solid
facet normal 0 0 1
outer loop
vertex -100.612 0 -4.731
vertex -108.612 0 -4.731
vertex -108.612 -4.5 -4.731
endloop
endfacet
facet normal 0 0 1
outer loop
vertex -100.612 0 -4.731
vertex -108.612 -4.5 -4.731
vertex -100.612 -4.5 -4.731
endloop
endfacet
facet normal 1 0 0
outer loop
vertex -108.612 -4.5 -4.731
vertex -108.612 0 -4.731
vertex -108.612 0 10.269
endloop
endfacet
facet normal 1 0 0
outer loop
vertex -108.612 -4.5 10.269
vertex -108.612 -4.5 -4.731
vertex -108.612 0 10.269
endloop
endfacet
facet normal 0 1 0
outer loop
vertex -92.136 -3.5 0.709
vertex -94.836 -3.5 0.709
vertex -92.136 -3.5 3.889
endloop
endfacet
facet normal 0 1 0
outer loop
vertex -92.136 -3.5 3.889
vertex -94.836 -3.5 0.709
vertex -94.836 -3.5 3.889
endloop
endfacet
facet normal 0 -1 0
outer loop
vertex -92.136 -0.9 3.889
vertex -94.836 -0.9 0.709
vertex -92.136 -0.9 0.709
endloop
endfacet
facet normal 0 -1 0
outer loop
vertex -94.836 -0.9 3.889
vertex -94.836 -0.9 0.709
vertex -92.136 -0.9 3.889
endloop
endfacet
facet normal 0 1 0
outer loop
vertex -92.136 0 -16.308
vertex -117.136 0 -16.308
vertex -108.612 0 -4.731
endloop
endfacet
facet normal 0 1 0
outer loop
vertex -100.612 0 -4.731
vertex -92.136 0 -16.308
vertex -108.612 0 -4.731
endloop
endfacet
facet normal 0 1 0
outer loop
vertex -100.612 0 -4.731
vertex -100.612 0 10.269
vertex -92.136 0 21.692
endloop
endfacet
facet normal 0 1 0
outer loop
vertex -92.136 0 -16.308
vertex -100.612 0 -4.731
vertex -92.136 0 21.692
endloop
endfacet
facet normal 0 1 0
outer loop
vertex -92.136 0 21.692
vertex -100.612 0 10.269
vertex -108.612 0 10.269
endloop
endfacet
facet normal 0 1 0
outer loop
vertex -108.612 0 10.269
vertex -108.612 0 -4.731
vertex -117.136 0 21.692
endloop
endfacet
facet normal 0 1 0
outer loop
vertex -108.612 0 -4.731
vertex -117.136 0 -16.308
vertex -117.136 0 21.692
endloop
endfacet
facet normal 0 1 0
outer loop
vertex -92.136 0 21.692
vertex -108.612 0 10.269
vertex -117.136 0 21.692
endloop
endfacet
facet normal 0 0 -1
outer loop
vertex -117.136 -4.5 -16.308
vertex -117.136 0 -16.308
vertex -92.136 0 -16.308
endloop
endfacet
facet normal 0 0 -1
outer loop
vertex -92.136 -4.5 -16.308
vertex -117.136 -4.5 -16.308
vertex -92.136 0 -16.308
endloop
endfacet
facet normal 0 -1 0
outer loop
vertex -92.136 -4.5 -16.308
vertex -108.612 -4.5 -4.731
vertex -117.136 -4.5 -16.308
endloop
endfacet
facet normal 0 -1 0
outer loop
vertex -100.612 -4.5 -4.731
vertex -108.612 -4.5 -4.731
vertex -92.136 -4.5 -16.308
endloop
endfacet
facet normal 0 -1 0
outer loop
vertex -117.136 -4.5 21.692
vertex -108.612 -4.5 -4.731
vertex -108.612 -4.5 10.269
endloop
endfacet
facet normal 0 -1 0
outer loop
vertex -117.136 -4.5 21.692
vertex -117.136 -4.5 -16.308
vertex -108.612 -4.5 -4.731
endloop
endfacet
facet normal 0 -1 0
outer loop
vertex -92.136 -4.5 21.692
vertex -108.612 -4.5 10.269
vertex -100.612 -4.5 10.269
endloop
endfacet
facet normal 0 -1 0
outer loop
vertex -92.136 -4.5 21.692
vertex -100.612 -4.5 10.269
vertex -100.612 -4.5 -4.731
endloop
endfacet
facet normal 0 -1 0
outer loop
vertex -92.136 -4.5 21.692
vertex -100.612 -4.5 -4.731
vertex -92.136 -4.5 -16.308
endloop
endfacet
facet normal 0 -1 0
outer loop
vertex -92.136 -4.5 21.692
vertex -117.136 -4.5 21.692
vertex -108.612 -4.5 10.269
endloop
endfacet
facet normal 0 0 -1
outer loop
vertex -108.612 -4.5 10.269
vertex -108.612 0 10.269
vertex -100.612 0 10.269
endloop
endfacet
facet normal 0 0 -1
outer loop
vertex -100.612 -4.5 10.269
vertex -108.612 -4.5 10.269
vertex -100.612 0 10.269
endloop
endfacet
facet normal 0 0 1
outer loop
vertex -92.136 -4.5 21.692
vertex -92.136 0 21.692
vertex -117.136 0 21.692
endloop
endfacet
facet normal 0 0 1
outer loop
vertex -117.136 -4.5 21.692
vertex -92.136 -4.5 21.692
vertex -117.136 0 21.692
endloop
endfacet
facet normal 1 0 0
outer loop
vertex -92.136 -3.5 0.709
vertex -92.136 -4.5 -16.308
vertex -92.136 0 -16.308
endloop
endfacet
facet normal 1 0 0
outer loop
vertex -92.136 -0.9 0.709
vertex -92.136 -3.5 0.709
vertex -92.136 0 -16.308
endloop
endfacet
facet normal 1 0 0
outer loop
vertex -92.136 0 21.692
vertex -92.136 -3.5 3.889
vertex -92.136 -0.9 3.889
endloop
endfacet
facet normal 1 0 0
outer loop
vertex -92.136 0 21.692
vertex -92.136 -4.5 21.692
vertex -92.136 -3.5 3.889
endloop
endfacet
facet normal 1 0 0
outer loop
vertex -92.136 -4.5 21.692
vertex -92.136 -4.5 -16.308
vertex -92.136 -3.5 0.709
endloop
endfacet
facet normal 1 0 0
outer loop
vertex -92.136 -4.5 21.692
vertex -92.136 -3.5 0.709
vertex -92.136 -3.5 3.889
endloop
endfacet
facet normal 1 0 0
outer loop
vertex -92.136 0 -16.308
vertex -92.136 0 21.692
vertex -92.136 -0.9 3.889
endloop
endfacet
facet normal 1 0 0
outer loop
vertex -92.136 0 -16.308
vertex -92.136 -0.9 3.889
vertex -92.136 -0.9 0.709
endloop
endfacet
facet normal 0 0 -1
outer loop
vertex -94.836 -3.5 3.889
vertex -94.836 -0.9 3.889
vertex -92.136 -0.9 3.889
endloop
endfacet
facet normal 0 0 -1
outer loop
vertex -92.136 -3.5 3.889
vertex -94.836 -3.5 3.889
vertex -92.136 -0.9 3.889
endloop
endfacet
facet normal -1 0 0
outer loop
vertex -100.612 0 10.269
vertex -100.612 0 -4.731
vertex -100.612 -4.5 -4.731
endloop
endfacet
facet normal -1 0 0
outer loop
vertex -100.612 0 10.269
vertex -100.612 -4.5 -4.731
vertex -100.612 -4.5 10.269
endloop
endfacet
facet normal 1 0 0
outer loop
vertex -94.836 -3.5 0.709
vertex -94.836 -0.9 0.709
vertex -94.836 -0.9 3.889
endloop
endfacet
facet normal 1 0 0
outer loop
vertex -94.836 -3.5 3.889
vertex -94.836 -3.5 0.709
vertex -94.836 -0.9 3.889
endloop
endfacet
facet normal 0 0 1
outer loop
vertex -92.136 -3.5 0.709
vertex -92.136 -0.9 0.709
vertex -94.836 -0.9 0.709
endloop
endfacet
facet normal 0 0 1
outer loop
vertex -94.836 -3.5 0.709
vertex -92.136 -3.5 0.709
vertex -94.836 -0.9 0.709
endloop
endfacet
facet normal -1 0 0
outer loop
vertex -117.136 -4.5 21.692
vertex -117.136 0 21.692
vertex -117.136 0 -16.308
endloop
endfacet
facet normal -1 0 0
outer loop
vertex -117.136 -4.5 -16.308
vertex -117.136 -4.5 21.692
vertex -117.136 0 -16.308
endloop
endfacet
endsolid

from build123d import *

# Parameters (mm, degrees)
F0_W     = 8
F0_H     = 15
F1_DEPTH = 4.5
F2_W     = 0.9
F2_H     = 3.18
F2_W_2   = 1
F3_DEPTH = 2.7


# Not quite as in the source:
# - a feature names something its author has since deleted; it is built from what else it names


with BuildPart() as f1:
    # F0 (on Front) → F1 (new body)
    with BuildSketch(Plane.XZ):
        Polygon((-92.1357174787, 21.691892745), (-117.1357174787, 21.691892745), (-117.1357174787, -16.308107255), (-92.1357174787, -16.308107255), (-92.1357174787, 0.7088574011), (-94.8357174787, 0.7088574011), (-94.8357174787, 3.8888574011), (-92.1357174787, 3.8888574011), align=None)
        with Locations((-104.6122670679, 2.7691081924)):
            Rectangle(F0_W, F0_H, mode=Mode.SUBTRACT)
    extrude(amount=F1_DEPTH)

    # F2 (on face) → F3 (join)
    with BuildSketch(Plane.YZ.offset(-94.8357174787)):
        with Locations((-0.45, 2.2988574011)):
            Rectangle(F2_W, F2_H)
        with Locations((-4, 2.2988574011)):
            Rectangle(F2_W_2, F2_H)
    extrude(amount=F3_DEPTH)


solid = f1.part
